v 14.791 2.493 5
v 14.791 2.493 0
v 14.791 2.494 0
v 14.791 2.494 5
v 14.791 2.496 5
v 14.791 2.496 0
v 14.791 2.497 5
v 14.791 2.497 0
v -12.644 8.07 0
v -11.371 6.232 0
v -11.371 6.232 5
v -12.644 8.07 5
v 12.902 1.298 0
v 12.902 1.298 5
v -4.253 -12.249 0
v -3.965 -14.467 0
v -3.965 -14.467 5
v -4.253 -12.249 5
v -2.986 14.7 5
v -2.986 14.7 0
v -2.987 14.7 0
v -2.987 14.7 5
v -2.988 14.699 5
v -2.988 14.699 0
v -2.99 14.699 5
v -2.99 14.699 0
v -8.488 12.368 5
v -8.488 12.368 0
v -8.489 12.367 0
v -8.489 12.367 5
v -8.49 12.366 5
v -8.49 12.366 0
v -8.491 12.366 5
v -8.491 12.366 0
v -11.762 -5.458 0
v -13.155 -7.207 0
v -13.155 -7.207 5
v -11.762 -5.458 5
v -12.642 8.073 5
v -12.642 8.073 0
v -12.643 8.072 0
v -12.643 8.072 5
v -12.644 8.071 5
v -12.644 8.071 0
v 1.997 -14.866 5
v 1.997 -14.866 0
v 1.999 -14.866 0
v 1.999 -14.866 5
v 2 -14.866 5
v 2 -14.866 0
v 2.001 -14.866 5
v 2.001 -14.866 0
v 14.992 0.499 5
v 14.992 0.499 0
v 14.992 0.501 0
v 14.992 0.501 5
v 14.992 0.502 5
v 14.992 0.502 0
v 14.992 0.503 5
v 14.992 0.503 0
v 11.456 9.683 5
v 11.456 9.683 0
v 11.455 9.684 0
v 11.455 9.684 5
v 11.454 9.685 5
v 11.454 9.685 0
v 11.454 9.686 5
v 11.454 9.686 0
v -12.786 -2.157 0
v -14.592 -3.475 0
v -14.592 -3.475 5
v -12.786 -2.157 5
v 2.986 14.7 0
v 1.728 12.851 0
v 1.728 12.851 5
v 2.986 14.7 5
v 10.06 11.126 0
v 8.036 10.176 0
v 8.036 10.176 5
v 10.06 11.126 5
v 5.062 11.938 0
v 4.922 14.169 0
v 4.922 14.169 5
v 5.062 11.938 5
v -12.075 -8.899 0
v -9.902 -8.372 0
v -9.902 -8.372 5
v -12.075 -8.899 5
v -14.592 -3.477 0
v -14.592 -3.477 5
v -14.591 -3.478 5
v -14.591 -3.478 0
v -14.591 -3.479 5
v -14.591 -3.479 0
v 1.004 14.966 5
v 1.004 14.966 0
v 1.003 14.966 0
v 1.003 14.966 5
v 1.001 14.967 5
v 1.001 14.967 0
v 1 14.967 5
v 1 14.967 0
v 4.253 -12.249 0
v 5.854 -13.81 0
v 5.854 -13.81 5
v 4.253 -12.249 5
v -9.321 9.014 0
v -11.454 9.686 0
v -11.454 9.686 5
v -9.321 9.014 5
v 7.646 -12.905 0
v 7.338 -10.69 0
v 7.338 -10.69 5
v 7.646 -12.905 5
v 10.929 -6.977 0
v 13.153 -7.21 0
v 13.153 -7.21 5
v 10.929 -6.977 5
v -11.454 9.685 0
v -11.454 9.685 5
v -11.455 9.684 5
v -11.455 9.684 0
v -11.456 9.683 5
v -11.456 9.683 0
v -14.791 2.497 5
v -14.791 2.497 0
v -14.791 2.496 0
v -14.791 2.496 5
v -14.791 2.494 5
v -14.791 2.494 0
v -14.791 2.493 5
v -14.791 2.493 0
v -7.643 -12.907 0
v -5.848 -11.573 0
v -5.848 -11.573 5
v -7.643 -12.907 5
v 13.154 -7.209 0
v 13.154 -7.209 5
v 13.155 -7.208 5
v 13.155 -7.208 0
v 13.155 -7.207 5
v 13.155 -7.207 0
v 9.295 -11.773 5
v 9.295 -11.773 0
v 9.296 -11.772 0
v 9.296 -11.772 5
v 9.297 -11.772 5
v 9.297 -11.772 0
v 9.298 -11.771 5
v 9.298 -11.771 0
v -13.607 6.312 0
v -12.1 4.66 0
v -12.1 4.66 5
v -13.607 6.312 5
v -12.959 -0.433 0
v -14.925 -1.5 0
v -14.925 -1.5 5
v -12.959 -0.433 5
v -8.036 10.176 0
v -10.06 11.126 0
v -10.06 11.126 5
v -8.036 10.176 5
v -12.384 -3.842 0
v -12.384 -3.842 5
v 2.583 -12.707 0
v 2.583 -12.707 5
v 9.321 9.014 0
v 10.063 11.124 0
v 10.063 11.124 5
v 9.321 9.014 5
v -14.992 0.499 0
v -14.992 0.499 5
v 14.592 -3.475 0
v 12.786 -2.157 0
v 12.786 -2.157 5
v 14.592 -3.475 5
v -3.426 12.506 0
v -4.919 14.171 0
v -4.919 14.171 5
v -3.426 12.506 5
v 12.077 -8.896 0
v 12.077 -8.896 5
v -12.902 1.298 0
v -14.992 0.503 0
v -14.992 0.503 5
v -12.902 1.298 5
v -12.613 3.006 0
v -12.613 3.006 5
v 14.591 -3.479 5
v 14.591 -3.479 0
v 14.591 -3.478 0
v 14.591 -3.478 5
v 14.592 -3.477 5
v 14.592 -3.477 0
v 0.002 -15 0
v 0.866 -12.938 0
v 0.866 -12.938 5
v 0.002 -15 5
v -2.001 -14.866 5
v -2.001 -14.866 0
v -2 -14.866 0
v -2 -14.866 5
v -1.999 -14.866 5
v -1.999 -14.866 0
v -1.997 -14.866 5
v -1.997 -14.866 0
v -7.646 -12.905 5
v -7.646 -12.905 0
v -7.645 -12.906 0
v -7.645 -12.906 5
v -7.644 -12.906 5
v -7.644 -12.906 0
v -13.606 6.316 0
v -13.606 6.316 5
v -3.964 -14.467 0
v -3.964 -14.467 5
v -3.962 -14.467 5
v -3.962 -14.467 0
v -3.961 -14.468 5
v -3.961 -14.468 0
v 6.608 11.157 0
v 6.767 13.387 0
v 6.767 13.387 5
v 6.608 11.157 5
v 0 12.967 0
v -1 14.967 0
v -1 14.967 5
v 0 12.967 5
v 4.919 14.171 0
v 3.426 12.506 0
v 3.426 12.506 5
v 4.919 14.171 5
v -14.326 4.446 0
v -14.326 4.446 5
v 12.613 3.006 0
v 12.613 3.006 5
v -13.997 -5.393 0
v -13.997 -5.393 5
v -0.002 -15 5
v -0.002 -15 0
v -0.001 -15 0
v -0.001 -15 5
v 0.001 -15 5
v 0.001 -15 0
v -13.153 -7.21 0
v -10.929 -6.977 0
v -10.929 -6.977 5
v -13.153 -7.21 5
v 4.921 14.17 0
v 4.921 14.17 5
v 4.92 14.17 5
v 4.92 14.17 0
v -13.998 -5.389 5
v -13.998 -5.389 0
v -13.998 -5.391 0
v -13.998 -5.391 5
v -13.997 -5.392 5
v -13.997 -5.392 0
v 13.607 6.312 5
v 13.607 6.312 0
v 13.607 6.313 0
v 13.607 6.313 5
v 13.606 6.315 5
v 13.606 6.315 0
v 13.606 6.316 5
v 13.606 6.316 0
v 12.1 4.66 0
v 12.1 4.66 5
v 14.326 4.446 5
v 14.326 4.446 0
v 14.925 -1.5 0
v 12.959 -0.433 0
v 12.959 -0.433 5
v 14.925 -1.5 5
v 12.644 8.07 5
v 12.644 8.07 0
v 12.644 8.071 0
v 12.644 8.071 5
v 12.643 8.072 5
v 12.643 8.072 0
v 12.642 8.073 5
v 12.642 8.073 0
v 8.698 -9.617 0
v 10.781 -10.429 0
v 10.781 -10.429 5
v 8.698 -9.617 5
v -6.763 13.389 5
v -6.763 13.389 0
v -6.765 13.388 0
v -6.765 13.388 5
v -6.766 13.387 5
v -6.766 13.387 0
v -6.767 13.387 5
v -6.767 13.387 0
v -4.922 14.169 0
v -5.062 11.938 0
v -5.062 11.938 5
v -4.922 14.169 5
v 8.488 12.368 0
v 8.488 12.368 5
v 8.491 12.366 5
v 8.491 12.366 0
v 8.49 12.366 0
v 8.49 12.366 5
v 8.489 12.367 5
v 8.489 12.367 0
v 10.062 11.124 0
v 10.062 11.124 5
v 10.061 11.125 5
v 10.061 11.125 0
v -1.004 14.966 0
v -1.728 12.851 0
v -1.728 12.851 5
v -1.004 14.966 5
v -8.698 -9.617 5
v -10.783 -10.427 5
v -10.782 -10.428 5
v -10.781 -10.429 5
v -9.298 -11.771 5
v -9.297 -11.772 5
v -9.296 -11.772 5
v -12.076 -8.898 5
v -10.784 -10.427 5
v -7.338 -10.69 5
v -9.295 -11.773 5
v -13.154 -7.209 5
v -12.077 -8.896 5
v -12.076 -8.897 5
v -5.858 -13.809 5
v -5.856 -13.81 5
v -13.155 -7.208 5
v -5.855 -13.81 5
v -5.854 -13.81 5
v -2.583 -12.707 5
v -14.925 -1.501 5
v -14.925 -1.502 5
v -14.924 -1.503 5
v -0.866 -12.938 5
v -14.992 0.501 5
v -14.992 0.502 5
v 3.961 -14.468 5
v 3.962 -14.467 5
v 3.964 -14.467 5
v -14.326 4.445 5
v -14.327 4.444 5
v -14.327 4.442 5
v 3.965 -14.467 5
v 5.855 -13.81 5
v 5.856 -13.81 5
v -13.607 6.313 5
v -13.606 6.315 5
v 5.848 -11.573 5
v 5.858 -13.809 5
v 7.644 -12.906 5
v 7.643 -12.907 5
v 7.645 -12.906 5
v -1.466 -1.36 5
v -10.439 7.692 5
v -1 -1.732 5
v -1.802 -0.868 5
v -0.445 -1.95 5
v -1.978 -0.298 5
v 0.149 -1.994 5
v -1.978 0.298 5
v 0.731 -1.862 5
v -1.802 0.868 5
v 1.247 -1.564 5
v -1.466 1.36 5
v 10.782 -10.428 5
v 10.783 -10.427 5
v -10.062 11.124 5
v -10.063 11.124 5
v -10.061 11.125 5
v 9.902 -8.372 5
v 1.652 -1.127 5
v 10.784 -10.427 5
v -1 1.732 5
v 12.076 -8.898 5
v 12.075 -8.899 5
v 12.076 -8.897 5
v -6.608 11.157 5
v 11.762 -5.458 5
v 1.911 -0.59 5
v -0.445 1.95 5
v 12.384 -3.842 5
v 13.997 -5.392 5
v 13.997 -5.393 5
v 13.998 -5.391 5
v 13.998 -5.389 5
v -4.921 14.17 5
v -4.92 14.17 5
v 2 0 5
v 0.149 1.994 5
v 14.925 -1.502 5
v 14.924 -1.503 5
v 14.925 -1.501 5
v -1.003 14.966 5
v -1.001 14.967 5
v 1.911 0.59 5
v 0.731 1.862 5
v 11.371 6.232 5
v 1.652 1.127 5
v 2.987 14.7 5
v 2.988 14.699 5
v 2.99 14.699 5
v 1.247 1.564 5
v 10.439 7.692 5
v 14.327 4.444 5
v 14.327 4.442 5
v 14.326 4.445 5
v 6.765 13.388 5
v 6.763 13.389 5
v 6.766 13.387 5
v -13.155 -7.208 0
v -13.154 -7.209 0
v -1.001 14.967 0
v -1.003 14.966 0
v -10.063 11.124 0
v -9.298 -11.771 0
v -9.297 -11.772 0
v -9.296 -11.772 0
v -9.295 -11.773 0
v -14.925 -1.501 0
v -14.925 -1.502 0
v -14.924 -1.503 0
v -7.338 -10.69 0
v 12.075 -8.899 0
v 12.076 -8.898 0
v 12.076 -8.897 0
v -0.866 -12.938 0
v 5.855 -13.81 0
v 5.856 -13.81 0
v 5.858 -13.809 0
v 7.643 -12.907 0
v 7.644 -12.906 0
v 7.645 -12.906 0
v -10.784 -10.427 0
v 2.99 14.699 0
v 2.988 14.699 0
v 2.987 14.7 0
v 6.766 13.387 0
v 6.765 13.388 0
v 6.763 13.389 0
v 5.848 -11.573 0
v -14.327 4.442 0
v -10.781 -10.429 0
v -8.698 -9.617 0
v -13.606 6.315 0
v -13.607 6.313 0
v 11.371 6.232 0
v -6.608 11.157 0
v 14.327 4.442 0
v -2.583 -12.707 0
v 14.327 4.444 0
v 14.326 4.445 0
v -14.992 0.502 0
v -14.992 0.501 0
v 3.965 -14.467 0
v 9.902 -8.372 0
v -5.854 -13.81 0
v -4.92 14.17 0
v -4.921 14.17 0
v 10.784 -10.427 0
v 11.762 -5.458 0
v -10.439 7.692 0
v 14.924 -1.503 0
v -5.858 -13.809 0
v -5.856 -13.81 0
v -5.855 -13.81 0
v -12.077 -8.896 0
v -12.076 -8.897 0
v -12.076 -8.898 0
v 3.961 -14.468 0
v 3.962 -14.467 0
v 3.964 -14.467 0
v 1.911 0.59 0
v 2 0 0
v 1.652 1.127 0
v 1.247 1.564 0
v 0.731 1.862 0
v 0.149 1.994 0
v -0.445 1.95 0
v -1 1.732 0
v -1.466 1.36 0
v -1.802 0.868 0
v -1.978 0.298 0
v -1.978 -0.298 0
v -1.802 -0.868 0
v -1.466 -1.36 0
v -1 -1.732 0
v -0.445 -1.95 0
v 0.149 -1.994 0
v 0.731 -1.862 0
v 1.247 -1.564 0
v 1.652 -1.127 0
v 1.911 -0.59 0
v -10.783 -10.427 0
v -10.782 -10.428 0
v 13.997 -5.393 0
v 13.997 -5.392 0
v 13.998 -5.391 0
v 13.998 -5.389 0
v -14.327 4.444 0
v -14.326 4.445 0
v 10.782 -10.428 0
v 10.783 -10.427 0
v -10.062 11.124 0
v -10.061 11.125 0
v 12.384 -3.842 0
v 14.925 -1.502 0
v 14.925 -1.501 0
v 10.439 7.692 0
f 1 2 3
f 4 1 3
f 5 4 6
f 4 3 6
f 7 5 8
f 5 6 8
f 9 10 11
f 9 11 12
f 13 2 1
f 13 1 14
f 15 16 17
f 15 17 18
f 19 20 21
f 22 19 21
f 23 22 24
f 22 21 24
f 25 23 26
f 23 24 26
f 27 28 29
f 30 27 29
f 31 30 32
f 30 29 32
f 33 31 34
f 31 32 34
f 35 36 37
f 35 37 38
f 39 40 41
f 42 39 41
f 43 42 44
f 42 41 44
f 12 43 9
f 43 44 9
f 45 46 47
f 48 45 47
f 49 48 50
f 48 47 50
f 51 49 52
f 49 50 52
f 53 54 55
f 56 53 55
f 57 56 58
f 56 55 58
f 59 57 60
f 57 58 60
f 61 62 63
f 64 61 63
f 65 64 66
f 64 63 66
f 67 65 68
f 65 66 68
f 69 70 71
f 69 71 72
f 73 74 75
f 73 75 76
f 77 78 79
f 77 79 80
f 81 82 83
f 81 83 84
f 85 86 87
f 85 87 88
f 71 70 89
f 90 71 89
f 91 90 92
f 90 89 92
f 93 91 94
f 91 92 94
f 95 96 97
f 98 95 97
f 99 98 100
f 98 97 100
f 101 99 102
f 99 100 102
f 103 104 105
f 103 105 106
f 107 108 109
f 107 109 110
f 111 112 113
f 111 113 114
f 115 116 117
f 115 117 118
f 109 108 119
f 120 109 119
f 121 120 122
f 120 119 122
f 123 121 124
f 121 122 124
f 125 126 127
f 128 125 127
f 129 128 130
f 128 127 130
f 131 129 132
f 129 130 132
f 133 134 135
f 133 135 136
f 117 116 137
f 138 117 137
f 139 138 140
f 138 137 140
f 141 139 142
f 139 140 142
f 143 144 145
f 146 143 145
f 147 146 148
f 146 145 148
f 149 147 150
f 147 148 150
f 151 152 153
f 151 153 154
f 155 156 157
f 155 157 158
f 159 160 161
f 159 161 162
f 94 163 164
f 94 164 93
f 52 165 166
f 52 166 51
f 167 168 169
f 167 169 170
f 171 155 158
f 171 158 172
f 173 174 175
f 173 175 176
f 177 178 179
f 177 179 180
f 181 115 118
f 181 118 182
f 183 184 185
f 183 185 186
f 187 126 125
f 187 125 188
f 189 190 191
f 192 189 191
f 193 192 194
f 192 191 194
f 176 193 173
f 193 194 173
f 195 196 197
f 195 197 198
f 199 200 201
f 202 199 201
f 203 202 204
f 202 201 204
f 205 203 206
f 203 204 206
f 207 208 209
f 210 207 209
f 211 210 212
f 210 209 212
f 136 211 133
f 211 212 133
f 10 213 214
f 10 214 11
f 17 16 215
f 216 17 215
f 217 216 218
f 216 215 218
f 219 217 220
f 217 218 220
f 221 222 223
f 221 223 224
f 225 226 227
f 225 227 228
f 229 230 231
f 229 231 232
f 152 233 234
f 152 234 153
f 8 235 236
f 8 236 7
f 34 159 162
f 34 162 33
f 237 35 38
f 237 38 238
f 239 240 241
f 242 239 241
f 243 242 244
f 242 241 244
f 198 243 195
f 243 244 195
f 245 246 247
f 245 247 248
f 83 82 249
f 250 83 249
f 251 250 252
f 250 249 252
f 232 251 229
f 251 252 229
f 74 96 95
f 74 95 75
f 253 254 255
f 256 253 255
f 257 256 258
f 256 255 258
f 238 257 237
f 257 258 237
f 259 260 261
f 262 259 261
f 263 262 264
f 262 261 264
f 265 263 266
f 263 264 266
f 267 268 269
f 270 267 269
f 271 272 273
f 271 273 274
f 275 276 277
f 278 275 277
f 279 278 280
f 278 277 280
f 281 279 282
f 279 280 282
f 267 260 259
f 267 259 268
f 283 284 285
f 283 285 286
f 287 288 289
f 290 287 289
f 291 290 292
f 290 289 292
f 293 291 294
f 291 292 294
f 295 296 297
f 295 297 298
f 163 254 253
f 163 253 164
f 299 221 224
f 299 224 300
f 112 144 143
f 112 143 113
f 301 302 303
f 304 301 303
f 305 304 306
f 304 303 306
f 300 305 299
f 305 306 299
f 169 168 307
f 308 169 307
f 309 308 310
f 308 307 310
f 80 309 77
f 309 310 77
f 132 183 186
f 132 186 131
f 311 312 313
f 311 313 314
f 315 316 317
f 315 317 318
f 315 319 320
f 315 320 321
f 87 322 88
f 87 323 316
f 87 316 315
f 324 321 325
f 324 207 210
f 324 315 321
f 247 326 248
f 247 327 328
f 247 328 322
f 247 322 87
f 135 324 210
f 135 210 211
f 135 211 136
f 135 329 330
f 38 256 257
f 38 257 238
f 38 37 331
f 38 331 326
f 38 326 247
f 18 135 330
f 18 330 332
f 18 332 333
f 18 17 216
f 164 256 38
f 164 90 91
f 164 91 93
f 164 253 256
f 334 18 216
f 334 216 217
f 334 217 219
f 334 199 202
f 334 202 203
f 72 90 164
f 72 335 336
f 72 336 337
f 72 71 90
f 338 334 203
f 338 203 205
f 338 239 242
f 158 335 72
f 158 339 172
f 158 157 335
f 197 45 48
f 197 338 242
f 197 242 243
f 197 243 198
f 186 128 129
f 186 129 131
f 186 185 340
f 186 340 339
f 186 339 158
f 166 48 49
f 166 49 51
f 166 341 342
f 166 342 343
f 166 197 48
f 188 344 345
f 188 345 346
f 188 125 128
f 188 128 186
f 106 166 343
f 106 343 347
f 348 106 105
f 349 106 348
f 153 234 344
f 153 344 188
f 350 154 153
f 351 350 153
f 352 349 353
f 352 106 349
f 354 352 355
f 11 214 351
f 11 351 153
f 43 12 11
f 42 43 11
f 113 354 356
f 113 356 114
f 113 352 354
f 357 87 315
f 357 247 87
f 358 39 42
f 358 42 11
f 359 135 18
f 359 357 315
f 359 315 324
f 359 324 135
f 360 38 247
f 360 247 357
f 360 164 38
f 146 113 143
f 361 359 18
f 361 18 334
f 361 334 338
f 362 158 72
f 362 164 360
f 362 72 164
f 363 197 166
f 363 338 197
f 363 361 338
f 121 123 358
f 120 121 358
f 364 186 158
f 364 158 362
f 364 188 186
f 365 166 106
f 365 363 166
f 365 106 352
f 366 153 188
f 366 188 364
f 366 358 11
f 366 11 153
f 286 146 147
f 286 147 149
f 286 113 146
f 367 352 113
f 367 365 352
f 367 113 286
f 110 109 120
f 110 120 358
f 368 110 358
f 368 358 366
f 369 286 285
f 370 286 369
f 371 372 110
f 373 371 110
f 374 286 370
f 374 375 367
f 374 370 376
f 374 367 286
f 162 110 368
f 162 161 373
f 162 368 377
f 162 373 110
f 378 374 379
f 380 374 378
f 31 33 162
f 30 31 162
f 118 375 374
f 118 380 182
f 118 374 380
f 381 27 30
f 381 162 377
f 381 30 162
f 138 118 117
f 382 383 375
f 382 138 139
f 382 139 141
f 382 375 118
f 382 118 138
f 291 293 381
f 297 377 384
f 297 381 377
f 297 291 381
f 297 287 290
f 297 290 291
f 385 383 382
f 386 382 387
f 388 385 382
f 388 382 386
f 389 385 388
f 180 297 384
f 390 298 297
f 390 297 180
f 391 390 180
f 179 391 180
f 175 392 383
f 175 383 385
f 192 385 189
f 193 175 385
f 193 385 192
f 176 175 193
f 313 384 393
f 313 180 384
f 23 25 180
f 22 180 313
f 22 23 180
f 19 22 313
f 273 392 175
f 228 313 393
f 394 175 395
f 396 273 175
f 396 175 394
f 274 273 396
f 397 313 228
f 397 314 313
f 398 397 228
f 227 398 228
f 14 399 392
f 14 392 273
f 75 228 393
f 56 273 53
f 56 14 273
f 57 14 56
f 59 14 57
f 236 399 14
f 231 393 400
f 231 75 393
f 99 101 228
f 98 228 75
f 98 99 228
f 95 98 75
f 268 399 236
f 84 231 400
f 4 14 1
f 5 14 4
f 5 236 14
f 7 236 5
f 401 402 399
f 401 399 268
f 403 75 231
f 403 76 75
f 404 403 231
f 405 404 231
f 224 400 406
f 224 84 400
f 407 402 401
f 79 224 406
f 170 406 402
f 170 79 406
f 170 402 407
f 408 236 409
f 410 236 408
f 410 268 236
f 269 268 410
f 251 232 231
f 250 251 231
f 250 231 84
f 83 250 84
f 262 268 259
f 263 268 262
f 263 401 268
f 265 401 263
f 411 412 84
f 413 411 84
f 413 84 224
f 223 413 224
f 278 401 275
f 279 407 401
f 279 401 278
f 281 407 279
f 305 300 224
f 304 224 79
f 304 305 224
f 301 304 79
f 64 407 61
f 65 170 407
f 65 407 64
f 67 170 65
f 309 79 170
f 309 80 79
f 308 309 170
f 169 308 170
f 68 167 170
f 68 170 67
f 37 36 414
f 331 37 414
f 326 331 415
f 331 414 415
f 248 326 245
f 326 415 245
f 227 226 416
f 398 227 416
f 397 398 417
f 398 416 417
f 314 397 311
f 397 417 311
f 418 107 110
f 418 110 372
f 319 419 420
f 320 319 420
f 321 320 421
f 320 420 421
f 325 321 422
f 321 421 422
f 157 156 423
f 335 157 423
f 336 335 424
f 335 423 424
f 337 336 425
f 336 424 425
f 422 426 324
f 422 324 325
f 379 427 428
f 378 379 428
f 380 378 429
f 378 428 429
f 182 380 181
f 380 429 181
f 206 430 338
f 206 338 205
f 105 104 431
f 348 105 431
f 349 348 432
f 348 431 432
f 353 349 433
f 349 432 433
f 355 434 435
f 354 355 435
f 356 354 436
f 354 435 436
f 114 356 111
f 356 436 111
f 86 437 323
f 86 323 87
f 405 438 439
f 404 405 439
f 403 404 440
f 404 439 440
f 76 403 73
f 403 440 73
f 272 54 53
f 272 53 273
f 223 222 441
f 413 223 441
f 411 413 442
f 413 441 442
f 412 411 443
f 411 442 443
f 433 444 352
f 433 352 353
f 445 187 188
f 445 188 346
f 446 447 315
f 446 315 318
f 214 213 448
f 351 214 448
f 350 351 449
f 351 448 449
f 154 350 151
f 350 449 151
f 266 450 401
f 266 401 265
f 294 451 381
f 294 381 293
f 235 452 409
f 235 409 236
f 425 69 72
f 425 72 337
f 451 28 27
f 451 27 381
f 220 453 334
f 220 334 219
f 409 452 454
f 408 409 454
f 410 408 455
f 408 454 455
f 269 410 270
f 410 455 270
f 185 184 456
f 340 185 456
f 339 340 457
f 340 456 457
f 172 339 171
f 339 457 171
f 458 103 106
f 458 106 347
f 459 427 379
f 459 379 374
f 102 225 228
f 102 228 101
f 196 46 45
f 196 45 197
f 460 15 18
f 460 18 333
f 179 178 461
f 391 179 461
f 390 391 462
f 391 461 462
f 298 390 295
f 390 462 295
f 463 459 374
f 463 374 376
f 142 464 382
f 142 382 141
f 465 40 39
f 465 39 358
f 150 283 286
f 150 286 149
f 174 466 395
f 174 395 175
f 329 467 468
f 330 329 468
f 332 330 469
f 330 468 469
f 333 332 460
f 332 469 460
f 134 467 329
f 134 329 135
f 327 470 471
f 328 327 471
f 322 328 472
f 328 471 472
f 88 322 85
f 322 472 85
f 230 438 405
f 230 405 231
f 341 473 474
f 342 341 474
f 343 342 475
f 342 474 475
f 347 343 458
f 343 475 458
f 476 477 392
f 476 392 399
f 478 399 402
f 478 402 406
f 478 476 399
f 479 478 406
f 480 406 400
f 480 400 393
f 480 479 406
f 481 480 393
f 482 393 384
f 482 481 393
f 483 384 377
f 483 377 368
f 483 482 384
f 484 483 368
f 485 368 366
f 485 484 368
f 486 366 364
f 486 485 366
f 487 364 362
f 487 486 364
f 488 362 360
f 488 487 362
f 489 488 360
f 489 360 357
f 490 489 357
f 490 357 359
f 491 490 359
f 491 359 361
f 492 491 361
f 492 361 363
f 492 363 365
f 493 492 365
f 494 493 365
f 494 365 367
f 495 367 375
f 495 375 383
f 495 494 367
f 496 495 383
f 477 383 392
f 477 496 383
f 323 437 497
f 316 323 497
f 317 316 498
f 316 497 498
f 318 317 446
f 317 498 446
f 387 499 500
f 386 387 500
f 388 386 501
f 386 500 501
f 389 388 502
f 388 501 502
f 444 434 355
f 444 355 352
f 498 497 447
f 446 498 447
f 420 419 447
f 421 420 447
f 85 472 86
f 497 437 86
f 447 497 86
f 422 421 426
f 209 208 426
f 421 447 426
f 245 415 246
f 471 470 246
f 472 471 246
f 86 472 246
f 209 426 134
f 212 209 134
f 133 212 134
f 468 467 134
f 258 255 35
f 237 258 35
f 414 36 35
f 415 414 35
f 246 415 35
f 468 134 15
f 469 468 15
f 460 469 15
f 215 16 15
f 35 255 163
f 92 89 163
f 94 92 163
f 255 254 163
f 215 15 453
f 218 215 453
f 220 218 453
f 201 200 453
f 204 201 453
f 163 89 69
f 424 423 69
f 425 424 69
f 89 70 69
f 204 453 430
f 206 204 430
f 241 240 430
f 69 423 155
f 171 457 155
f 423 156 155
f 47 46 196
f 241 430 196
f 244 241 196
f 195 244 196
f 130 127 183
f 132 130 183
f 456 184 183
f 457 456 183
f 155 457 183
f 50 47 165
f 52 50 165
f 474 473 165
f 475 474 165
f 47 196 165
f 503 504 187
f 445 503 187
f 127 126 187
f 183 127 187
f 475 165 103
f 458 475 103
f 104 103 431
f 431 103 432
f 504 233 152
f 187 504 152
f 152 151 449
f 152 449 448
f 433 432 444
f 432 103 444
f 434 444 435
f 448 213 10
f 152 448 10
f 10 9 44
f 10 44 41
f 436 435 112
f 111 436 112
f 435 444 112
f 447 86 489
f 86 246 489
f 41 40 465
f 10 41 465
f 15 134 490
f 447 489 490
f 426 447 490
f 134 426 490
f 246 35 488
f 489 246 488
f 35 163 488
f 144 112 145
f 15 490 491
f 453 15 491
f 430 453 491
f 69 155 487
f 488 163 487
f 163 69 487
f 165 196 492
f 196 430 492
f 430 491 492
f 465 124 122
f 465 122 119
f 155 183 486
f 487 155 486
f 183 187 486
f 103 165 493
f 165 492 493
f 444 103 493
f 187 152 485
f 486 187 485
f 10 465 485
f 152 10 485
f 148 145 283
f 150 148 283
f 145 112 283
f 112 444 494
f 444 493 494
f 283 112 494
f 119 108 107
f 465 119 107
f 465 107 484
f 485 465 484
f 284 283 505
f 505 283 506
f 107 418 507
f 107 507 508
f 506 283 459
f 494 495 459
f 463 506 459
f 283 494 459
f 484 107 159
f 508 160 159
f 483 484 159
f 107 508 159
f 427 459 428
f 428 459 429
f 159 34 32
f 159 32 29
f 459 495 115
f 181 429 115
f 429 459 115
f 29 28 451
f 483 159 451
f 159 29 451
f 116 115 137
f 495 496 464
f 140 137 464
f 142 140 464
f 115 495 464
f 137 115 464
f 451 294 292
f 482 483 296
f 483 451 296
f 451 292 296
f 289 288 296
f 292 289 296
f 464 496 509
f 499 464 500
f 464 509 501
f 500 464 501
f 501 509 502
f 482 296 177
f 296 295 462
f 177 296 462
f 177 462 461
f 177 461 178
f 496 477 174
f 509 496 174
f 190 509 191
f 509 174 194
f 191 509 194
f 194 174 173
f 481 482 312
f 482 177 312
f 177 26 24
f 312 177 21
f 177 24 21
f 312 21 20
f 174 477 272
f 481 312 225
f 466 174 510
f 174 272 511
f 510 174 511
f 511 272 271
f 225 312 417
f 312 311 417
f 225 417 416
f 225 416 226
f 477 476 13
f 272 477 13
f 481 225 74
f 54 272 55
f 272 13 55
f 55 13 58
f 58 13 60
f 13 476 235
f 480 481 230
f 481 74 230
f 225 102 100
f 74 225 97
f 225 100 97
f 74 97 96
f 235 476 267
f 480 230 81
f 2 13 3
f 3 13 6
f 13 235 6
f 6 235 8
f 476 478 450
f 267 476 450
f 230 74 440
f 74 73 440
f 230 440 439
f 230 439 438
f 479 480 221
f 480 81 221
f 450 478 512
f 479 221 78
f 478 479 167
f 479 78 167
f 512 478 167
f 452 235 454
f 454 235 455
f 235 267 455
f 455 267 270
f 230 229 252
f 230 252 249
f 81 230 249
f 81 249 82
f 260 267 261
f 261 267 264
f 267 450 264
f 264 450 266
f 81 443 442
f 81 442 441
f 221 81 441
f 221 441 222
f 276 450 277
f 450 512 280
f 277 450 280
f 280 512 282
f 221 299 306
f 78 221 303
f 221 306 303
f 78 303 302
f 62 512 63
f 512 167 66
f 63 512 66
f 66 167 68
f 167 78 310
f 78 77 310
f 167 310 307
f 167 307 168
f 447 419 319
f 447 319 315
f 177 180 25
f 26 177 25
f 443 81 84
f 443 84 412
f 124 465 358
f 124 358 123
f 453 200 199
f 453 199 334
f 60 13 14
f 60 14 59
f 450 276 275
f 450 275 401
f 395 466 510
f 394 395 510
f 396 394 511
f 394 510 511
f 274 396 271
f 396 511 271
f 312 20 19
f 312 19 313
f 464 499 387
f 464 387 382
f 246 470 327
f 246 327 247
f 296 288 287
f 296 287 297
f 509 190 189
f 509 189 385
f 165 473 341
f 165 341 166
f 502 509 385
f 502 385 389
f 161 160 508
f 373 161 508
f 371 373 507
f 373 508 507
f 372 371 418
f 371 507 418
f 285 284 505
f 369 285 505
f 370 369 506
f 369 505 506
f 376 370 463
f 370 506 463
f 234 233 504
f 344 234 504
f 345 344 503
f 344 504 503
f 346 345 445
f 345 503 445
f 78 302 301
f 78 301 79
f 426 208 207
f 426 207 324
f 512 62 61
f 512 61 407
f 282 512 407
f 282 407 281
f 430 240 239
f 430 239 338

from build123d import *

# Parameters (mm, degrees)
CROQUIS2_R              = 15
CROQUIS2_R_2            = 2
SALIENTE_EXTRUIR1_DEPTH = 5
CORTAR_EXTRUIR2_START   = -5
CORTAR_EXTRUIR2_DEPTH   = 5


with BuildPart() as part:
    # Croquis2 → Saliente-Extruir1 (new body)
    with BuildSketch(Plane.XY):
        Circle(CROQUIS2_R)
        Circle(CROQUIS2_R_2, mode=Mode.SUBTRACT)
    extrude(amount=SALIENTE_EXTRUIR1_DEPTH)

    # Croquis3 → Cortar-Extruir2 (cut)
    with BuildSketch(Plane.XY.offset(5).offset(CORTAR_EXTRUIR2_START)):
        with BuildLine():
            Line((-1, 14.966629547), (0, 12.966629547))
            Line((0, 12.966629547), (1, 14.966629547))
            ThreePointArc((1, 14.966629547), (0, 15), (-1, 14.966629547))
        make_face()
        with BuildLine():
            Line((1.003778996, 14.966376573), (1.728282574, 12.850934641))
            Line((1.728282574, 12.850934641), (2.985933973, 14.699802662))
            ThreePointArc((2.985933973, 14.699802662), (1.999304331, 14.866162322), (1.003778996, 14.966376573))
        make_face()
        with BuildLine():
            Line((2.989645533, 14.699048255), (3.425723904, 12.505914503))
            Line((3.425723904, 12.505914503), (4.918583883, 14.170657451))
            ThreePointArc((4.918583883, 14.170657451), (3.962931028, 14.467037626), (2.989645533, 14.699048255))
        make_face()
        with BuildLine():
            Line((4.922161774, 14.169415072), (5.06203311, 11.937726023))
            Line((5.06203311, 11.937726023), (6.763461547, 13.388636521))
            ThreePointArc((6.763461547, 13.388636521), (5.855839127, 13.8097483), (4.922161774, 14.169415072))
        make_face()
        with BuildLine():
            Line((6.766841921, 13.386928341), (6.608010216, 11.15650854))
            Line((6.608010216, 11.15650854), (8.48764508, 12.367695056))
            ThreePointArc((8.48764508, 12.367695056), (7.644249639, 12.906023689), (6.766841921, 13.386928341))
        make_face()
        with BuildLine():
            Line((8.490767615, 12.365551557), (8.036067222, 10.176202898))
            Line((8.036067222, 10.176202898), (10.060366385, 11.126051779))
            ThreePointArc((10.060366385, 11.126051779), (9.296248334, 11.771990779), (8.490767615, 12.365551557))
        make_face()
        with BuildLine():
            Line((10.063175359, 11.123511213), (9.320720419, 9.014302674))
            Line((9.320720419, 9.014302674), (11.453560214, 9.685863845))
            ThreePointArc((11.453560214, 9.685863845), (10.782355258, 10.427886415), (10.063175359, 11.123511213))
        make_face()
        with BuildLine():
            Line((11.4560055, 9.682971547), (10.439045138, 7.691542005))
            Line((10.439045138, 7.691542005), (12.642364989, 8.072831441))
            ThreePointArc((12.642364989, 8.072831441), (12.076050797, 8.897696171), (11.4560055, 9.682971547))
        make_face()
        with BuildLine():
            Line((12.644402952, 8.069639025), (11.37108485, 6.231525587))
            Line((11.37108485, 6.231525587), (13.605566462, 6.315739169))
            ThreePointArc((13.605566462, 6.315739169), (13.154248923, 7.208726328), (12.644402952, 8.069639025))
        make_face()
        with BuildLine():
            Line((13.607160733, 6.312303603), (12.100207284, 4.660307447))
            Line((12.100207284, 4.660307447), (14.325976279, 4.445942381))
            ThreePointArc((14.325976279, 4.445942381), (13.997709166, 5.391116593), (13.607160733, 6.312303603))
        make_face()
        with BuildLine():
            Line((14.327098409, 4.442324974), (12.613401232, 3.00592601))
            Line((12.613401232, 3.00592601), (14.79073871, 2.496807647))
            ThreePointArc((14.79073871, 2.496807647), (14.591379956, 3.477302254), (14.327098409, 4.442324974))
        make_face()
        with BuildLine():
            Line((14.791368674, 2.493072951), (12.901508736, 1.297903753))
            Line((12.901508736, 1.297903753), (14.991560058, 0.503117321))
            ThreePointArc((14.991560058, 0.503117321), (14.924667226, 1.501435374), (14.791368674, 2.493072951))
        make_face()
        with BuildLine():
            Line((14.991686615, 0.499331982), (12.959388511, -0.433279628))
            Line((12.959388511, -0.433279628), (14.924856661, -1.499551146))
            ThreePointArc((14.924856661, -1.499551146), (14.991623456, -0.501224655), (14.991686615, 0.499331982))
        make_face()
        with BuildLine():
            Line((14.924477553, -1.503319579), (12.786007691, -2.156731124))
            Line((12.786007691, -2.156731124), (14.591818844, -3.475460087))
            ThreePointArc((14.591818844, -3.475460087), (14.79105381, -2.494940319), (14.924477553, -1.503319579))
        make_face()
        with BuildLine():
            Line((14.590940836, -3.479144366), (12.384460261, -3.841695701))
            Line((12.384460261, -3.841695701), (13.998389674, -5.38934936))
            ThreePointArc((13.998389674, -5.38934936), (14.326537458, -4.444133713), (14.590940836, -3.479144366))
        make_face()
        with BuildLine():
            Line((13.997028434, -5.392883739), (11.761911844, -5.458105128))
            Line((11.761911844, -5.458105128), (13.155158909, -7.207065566))
            ThreePointArc((13.155158909, -7.207065566), (13.606363706, -6.314021436), (13.997028434, -5.392883739))
        make_face()
        with BuildLine():
            Line((13.153338728, -7.210386974), (10.929471832, -6.977114539))
            Line((10.929471832, -6.977114539), (12.077174021, -8.896171517))
            ThreePointArc((12.077174021, -8.896171517), (12.643384071, -8.071235297), (13.153338728, -7.210386974))
        make_face()
        with BuildLine():
            Line((12.07492738, -8.899220683), (9.901995135, -8.371617176))
            Line((9.901995135, -8.371617176), (10.783671677, -10.426525076))
            ThreePointArc((10.783671677, -10.426525076), (11.454782948, -9.684417773), (12.07492738, -8.899220683))
        make_face()
        with BuildLine():
            Line((10.781038667, -10.429247588), (8.697817102, -9.616728107))
            Line((8.697817102, -9.616728107), (9.297734456, -11.770817048))
            ThreePointArc((9.297734456, -11.770817048), (10.061770952, -11.124781585), (10.781038667, -10.429247588))
        make_face()
        with BuildLine():
            Line((9.294762064, -11.773164323), (7.338426315, -10.690228296))
            Line((7.338426315, -10.690228296), (7.645878944, -12.905058511))
            ThreePointArc((7.645878944, -12.905058511), (8.489206415, -12.366623405), (9.294762064, -11.773164323))
        make_face()
        with BuildLine():
            Line((7.642620212, -12.906988661), (5.848081138, -11.572961108))
            Line((5.848081138, -11.572961108), (5.85758254, -13.809008899))
            ThreePointArc((5.85758254, -13.809008899), (6.765151788, -13.387782538), (7.642620212, -12.906988661))
        make_face()
        with BuildLine():
            Line((5.854095621, -13.810487481), (4.253376814, -12.249174155))
            Line((4.253376814, -12.249174155), (3.964757438, -14.466537197))
            ThreePointArc((3.964757438, -14.466537197), (4.920372868, -14.170036374), (5.854095621, -13.810487481))
        make_face()
        with BuildLine():
            Line((3.961104555, -14.467537825), (2.58277088, -12.7068004))
            Line((2.58277088, -12.7068004), (2.001181145, -14.865909795))
            ThreePointArc((2.001181145, -14.865909795), (2.987789777, -14.699425576), (3.961104555, -14.467537825))
        make_face()
        with BuildLine():
            Line((1.997427484, -14.866414613), (0.866075338, -12.937673489))
            Line((0.866075338, -12.937673489), (0.001893727, -14.99999988))
            ThreePointArc((0.001893727, -14.99999988), (1.001889506, -14.966503179), (1.997427484, -14.866414613))
        make_face()
        with BuildLine():
            Line((-0.001893727, -14.99999988), (-0.866075338, -12.937673489))
            Line((-0.866075338, -12.937673489), (-1.997427484, -14.866414613))
            ThreePointArc((-1.997427484, -14.866414613), (-1.001889506, -14.966503179), (-0.001893727, -14.99999988))
        make_face()
        with BuildLine():
            Line((-2.001181145, -14.865909795), (-2.58277088, -12.7068004))
            Line((-2.58277088, -12.7068004), (-3.961104555, -14.467537825))
            ThreePointArc((-3.961104555, -14.467537825), (-2.987789777, -14.699425576), (-2.001181145, -14.865909795))
        make_face()
        with BuildLine():
            Line((-3.964757438, -14.466537197), (-4.253376814, -12.249174155))
            Line((-4.253376814, -12.249174155), (-5.854095621, -13.810487481))
            ThreePointArc((-5.854095621, -13.810487481), (-4.920372868, -14.170036374), (-3.964757438, -14.466537197))
        make_face()
        with BuildLine():
            Line((-5.85758254, -13.809008899), (-5.848081138, -11.572961108))
            Line((-5.848081138, -11.572961108), (-7.642620212, -12.906988661))
            ThreePointArc((-7.642620212, -12.906988661), (-6.765151788, -13.387782538), (-5.85758254, -13.809008899))
        make_face()
        with BuildLine():
            Line((-7.645878944, -12.905058511), (-7.338426315, -10.690228296))
            Line((-7.338426315, -10.690228296), (-9.294762064, -11.773164323))
            ThreePointArc((-9.294762064, -11.773164323), (-8.489206415, -12.366623405), (-7.645878944, -12.905058511))
        make_face()
        with BuildLine():
            Line((-9.297734456, -11.770817048), (-8.697817102, -9.616728107))
            Line((-8.697817102, -9.616728107), (-10.781038667, -10.429247588))
            ThreePointArc((-10.781038667, -10.429247588), (-10.061770952, -11.124781585), (-9.297734456, -11.770817048))
        make_face()
        with BuildLine():
            Line((-10.783671677, -10.426525076), (-9.901995135, -8.371617176))
            Line((-9.901995135, -8.371617176), (-12.07492738, -8.899220683))
            ThreePointArc((-12.07492738, -8.899220683), (-11.454782948, -9.684417773), (-10.783671677, -10.426525076))
        make_face()
        with BuildLine():
            Line((-12.077174021, -8.896171517), (-10.929471832, -6.977114539))
            Line((-10.929471832, -6.977114539), (-13.153338728, -7.210386974))
            ThreePointArc((-13.153338728, -7.210386974), (-12.643384071, -8.071235297), (-12.077174021, -8.896171517))
        make_face()
        with BuildLine():
            Line((-13.155158909, -7.207065566), (-11.761911844, -5.458105128))
            Line((-11.761911844, -5.458105128), (-13.997028434, -5.392883739))
            ThreePointArc((-13.997028434, -5.392883739), (-13.606363706, -6.314021436), (-13.155158909, -7.207065566))
        make_face()
        with BuildLine():
            Line((-13.998389674, -5.38934936), (-12.384460261, -3.841695701))
            Line((-12.384460261, -3.841695701), (-14.590940836, -3.479144366))
            ThreePointArc((-14.590940836, -3.479144366), (-14.326537458, -4.444133713), (-13.998389674, -5.38934936))
        make_face()
        with BuildLine():
            Line((-14.591818844, -3.475460087), (-12.786007691, -2.156731124))
            Line((-12.786007691, -2.156731124), (-14.924477553, -1.503319579))
            ThreePointArc((-14.924477553, -1.503319579), (-14.79105381, -2.494940319), (-14.591818844, -3.475460087))
        make_face()
        with BuildLine():
            Line((-14.924856661, -1.499551146), (-12.959388511, -0.433279628))
            Line((-12.959388511, -0.433279628), (-14.991686615, 0.499331982))
            ThreePointArc((-14.991686615, 0.499331982), (-14.991623456, -0.501224655), (-14.924856661, -1.499551146))
        make_face()
        with BuildLine():
            Line((-14.991560058, 0.503117321), (-12.901508736, 1.297903753))
            Line((-12.901508736, 1.297903753), (-14.791368674, 2.493072951))
            ThreePointArc((-14.791368674, 2.493072951), (-14.924667226, 1.501435374), (-14.991560058, 0.503117321))
        make_face()
        with BuildLine():
            Line((-14.79073871, 2.496807647), (-12.613401232, 3.00592601))
            Line((-12.613401232, 3.00592601), (-14.327098409, 4.442324974))
            ThreePointArc((-14.327098409, 4.442324974), (-14.591379956, 3.477302254), (-14.79073871, 2.496807647))
        make_face()
        with BuildLine():
            Line((-14.325976279, 4.445942381), (-12.100207284, 4.660307447))
            Line((-12.100207284, 4.660307447), (-13.607160733, 6.312303603))
            ThreePointArc((-13.607160733, 6.312303603), (-13.997709166, 5.391116593), (-14.325976279, 4.445942381))
        make_face()
        with BuildLine():
            Line((-13.605566462, 6.315739169), (-11.37108485, 6.231525587))
            Line((-11.37108485, 6.231525587), (-12.644402952, 8.069639025))
            ThreePointArc((-12.644402952, 8.069639025), (-13.154248923, 7.208726328), (-13.605566462, 6.315739169))
        make_face()
        with BuildLine():
            Line((-12.642364989, 8.072831441), (-10.439045138, 7.691542005))
            Line((-10.439045138, 7.691542005), (-11.4560055, 9.682971547))
            ThreePointArc((-11.4560055, 9.682971547), (-12.076050797, 8.897696171), (-12.642364989, 8.072831441))
        make_face()
        with BuildLine():
            Line((-11.453560214, 9.685863845), (-9.320720419, 9.014302674))
            Line((-9.320720419, 9.014302674), (-10.063175359, 11.123511213))
            ThreePointArc((-10.063175359, 11.123511213), (-10.782355258, 10.427886415), (-11.453560214, 9.685863845))
        make_face()
        with BuildLine():
            Line((-10.060366385, 11.126051779), (-8.036067222, 10.176202898))
            Line((-8.036067222, 10.176202898), (-8.490767615, 12.365551557))
            ThreePointArc((-8.490767615, 12.365551557), (-9.296248334, 11.771990779), (-10.060366385, 11.126051779))
        make_face()
        with BuildLine():
            Line((-8.48764508, 12.367695056), (-6.608010216, 11.15650854))
            Line((-6.608010216, 11.15650854), (-6.766841921, 13.386928341))
            ThreePointArc((-6.766841921, 13.386928341), (-7.644249639, 12.906023689), (-8.48764508, 12.367695056))
        make_face()
        with BuildLine():
            Line((-6.763461547, 13.388636521), (-5.06203311, 11.937726023))
            Line((-5.06203311, 11.937726023), (-4.922161774, 14.169415072))
            ThreePointArc((-4.922161774, 14.169415072), (-5.855839127, 13.8097483), (-6.763461547, 13.388636521))
        make_face()
        with BuildLine():
            Line((-4.918583883, 14.170657451), (-3.425723904, 12.505914503))
            Line((-3.425723904, 12.505914503), (-2.989645533, 14.699048255))
            ThreePointArc((-2.989645533, 14.699048255), (-3.962931028, 14.467037626), (-4.918583883, 14.170657451))
        make_face()
        with BuildLine():
            Line((-2.985933973, 14.699802662), (-1.728282574, 12.850934641))
            Line((-1.728282574, 12.850934641), (-1.003778996, 14.966376573))
            ThreePointArc((-1.003778996, 14.966376573), (-1.999304331, 14.866162322), (-2.985933973, 14.699802662))
        make_face()
    extrude(amount=CORTAR_EXTRUIR2_DEPTH, mode=Mode.SUBTRACT)


solid = part.part
